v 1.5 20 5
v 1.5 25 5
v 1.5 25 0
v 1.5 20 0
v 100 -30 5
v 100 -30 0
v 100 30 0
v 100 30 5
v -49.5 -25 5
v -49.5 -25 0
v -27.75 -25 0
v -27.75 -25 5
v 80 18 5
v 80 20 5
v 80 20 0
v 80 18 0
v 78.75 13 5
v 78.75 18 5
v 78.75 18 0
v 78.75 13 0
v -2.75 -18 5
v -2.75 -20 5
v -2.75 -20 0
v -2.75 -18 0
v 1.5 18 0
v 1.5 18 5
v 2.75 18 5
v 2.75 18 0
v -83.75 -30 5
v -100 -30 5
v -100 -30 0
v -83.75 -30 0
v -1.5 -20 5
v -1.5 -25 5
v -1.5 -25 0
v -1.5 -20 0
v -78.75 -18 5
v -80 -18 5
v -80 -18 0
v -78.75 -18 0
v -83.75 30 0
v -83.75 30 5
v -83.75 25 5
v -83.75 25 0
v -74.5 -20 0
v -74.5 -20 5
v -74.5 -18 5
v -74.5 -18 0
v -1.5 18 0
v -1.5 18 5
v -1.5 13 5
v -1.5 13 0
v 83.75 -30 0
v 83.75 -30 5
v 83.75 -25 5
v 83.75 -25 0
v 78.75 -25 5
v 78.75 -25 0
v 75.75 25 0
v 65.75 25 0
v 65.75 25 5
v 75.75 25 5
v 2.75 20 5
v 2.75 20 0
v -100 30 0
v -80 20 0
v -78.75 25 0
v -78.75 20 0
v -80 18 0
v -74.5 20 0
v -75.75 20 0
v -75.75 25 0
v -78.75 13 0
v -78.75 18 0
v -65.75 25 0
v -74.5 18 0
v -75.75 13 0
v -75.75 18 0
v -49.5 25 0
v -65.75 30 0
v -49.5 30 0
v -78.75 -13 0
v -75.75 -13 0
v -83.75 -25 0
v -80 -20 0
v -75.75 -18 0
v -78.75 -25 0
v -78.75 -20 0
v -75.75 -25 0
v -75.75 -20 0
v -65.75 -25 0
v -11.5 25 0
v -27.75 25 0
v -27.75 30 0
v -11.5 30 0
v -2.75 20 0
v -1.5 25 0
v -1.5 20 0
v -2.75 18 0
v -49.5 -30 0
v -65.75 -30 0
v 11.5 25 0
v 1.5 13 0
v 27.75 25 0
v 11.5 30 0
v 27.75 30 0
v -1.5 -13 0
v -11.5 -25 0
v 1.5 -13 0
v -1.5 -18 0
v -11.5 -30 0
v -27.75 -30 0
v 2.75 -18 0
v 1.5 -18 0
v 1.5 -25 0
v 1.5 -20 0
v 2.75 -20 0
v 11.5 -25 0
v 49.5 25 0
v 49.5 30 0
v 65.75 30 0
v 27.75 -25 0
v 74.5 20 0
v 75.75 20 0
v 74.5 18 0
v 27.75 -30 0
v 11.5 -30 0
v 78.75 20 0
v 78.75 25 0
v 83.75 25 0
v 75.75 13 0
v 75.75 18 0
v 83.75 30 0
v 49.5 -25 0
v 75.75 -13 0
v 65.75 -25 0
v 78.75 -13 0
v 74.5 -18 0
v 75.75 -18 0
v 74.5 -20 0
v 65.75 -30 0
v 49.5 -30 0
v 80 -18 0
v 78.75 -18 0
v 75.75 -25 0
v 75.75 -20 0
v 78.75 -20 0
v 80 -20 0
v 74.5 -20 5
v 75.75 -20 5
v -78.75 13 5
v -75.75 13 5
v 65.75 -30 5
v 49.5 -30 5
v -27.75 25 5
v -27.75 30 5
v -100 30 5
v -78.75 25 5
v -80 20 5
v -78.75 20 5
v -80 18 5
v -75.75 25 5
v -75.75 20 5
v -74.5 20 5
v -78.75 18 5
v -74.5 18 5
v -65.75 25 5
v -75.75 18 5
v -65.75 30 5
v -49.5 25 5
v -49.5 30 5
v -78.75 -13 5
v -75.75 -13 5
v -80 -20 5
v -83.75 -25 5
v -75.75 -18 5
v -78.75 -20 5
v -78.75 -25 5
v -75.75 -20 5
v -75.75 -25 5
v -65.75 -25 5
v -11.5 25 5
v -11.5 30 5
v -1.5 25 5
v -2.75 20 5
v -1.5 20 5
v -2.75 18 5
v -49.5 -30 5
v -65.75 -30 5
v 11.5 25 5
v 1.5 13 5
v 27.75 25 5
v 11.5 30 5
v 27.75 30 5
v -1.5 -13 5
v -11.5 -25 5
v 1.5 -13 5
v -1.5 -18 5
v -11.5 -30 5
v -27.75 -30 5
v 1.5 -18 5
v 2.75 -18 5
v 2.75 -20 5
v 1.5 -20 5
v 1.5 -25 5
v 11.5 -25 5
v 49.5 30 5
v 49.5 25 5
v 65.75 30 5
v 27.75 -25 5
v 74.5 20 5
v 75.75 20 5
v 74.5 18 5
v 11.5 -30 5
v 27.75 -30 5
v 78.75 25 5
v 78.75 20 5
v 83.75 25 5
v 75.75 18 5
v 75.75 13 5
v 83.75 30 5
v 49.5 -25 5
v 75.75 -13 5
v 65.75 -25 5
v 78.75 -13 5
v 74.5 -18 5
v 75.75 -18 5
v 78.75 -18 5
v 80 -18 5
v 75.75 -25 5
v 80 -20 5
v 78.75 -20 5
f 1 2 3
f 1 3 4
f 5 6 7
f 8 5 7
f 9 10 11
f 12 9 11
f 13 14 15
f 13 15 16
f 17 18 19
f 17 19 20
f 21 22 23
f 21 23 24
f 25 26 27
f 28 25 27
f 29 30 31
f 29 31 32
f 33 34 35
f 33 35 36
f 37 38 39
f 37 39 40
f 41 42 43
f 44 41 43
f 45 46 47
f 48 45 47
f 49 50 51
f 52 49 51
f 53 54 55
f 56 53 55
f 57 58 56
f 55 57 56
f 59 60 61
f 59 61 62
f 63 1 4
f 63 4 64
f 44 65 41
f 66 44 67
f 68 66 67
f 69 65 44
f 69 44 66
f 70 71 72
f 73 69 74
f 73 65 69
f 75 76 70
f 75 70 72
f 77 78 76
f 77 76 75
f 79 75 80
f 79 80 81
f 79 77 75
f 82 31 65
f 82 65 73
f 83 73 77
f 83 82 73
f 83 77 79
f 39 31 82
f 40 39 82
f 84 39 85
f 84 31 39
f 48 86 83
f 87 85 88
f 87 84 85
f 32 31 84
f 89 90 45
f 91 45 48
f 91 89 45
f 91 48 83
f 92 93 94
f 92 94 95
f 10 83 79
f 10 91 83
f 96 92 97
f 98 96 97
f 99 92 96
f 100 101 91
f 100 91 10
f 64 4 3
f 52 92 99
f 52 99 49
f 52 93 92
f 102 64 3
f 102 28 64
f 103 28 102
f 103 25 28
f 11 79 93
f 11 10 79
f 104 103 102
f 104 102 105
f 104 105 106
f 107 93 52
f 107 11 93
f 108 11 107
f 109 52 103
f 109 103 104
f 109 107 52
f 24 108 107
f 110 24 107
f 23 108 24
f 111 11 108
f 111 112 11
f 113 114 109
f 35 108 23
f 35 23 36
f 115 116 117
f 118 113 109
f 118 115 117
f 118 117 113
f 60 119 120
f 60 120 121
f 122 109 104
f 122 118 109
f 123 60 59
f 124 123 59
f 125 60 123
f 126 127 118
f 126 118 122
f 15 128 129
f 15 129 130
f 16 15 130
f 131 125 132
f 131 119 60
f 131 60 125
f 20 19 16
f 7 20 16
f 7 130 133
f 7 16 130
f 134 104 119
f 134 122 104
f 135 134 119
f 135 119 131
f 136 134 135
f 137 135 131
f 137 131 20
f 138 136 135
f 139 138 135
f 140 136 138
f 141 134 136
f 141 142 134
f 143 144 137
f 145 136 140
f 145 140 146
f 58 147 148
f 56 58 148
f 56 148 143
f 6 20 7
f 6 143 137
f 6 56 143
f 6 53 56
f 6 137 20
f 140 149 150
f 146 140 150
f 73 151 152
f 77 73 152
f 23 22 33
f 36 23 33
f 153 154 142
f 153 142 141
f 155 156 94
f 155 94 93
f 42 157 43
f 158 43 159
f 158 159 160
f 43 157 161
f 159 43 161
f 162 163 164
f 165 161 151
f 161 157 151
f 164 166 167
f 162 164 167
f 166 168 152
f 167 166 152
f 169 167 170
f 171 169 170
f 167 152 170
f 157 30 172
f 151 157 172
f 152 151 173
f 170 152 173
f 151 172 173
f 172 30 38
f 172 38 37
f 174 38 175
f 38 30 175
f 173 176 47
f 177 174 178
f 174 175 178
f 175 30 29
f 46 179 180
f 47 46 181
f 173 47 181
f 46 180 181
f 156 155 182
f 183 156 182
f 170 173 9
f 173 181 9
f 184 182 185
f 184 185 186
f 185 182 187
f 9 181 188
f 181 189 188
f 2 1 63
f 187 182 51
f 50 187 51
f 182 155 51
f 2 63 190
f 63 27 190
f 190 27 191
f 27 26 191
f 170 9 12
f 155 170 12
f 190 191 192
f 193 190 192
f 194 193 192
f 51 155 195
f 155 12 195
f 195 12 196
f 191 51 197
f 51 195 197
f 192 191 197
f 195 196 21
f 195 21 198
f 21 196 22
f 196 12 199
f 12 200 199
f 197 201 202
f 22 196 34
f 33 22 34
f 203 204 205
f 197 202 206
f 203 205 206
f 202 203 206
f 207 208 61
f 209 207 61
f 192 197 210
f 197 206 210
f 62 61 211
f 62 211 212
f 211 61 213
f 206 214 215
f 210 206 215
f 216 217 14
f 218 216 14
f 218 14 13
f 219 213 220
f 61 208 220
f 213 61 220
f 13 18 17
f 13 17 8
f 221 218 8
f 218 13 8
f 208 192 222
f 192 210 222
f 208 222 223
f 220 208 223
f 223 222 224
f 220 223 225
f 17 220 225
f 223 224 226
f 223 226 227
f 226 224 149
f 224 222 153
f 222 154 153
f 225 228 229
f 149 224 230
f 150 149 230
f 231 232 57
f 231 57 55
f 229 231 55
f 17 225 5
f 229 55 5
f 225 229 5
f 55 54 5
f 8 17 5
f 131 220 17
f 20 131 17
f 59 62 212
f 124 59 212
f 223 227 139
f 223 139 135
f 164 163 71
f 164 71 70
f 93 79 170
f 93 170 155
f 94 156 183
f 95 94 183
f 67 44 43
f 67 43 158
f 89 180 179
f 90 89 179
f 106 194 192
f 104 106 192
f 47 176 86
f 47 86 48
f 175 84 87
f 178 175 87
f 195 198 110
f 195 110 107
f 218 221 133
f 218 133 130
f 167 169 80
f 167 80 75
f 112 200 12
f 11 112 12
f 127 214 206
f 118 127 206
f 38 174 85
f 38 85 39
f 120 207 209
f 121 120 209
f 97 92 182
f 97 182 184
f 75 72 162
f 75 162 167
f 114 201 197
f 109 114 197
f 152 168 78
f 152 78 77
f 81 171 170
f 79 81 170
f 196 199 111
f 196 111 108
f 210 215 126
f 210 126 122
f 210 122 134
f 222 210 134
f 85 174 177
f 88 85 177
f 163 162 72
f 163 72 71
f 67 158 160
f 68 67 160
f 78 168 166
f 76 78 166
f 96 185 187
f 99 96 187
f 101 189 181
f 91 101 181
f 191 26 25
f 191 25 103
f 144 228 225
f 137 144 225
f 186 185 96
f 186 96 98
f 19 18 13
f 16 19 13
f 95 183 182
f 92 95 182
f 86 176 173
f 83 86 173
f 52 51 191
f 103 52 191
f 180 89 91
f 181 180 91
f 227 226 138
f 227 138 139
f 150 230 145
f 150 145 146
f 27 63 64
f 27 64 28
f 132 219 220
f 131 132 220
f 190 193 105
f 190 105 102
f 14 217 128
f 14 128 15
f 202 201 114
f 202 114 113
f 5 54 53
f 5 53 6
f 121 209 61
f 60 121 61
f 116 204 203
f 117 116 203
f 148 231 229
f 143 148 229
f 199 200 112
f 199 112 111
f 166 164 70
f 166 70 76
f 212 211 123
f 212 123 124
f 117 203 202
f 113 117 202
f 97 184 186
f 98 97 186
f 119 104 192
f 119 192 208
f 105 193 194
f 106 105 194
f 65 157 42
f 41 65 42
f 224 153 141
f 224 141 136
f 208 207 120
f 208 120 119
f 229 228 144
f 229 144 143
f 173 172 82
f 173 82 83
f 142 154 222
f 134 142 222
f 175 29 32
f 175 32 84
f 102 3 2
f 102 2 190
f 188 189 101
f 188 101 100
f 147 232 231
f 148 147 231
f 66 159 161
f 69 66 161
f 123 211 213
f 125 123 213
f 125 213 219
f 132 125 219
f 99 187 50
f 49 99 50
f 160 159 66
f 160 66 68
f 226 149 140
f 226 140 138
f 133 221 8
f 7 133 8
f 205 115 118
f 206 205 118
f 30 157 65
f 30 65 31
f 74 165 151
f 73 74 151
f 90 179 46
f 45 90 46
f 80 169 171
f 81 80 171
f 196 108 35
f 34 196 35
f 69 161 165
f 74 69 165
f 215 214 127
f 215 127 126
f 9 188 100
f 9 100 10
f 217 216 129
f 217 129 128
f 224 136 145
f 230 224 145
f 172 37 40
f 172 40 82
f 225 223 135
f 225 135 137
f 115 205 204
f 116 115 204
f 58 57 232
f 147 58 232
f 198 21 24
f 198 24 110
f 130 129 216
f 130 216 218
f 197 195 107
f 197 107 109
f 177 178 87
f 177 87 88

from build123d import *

# Parameters (mm, degrees)
SKETCH1_W           = 200
SKETCH1_H           = 50
BOSS_EXTRUDE1_DEPTH = 5
SKETCH2_W           = 5.5
SKETCH2_H           = 2
SKETCH2_W_2         = 3
SKETCH2_H_2         = 12
CUT_EXTRUDE1_DEPTH  = 5
SKETCH3_W           = 16.25
SKETCH3_H           = 5
BOSS_EXTRUDE2_DEPTH = 5


with BuildPart() as part:
    # Sketch1 → Boss-Extrude1 (new body)
    with BuildSketch(Plane.XY):
        Rectangle(SKETCH1_W, SKETCH1_H)
    extrude(amount=BOSS_EXTRUDE1_DEPTH)

    # Sketch2 → Cut-Extrude1 (cut)
    with BuildSketch(Plane.XY.offset(5)):
        with Locations((-77.25, -19)):
            Rectangle(SKETCH2_W, SKETCH2_H)
        with Locations((-77.25, -19)):
            Rectangle(SKETCH2_W_2, SKETCH2_H_2)
        with Locations((0, -19)):
            Rectangle(SKETCH2_W, SKETCH2_H)
        with Locations((0, -19)):
            Rectangle(SKETCH2_W_2, SKETCH2_H_2)
        with Locations((77.25, -19)):
            Rectangle(SKETCH2_W, SKETCH2_H)
        with Locations((77.25, -19)):
            Rectangle(SKETCH2_W_2, SKETCH2_H_2)
    cut_extrude1 = extrude(amount=-CUT_EXTRUDE1_DEPTH, mode=Mode.SUBTRACT)

    # Sketch3 → Boss-Extrude2 (add)
    with BuildSketch(Plane.XY.offset(5)):
        with Locations((-91.875, -27.5)):
            Rectangle(SKETCH3_W, SKETCH3_H)
        with Locations((-19.625, -27.5)):
            Rectangle(SKETCH3_W, SKETCH3_H)
        with Locations((19.625, -27.5)):
            Rectangle(SKETCH3_W, SKETCH3_H)
        with Locations((57.625, -27.5)):
            Rectangle(SKETCH3_W, SKETCH3_H)
        with Locations((91.875, -27.5)):
            Rectangle(SKETCH3_W, SKETCH3_H)
        with Locations((-57.625, -27.5)):
            Rectangle(SKETCH3_W, SKETCH3_H)
    boss_extrude2 = extrude(amount=-BOSS_EXTRUDE2_DEPTH)

    # Mirror1: Cut-Extrude1, Boss-Extrude2 across plane
    add(cut_extrude1.mirror(Plane.ZX), mode=Mode.SUBTRACT)
    add(boss_extrude2.mirror(Plane.ZX))


solid = part.part
